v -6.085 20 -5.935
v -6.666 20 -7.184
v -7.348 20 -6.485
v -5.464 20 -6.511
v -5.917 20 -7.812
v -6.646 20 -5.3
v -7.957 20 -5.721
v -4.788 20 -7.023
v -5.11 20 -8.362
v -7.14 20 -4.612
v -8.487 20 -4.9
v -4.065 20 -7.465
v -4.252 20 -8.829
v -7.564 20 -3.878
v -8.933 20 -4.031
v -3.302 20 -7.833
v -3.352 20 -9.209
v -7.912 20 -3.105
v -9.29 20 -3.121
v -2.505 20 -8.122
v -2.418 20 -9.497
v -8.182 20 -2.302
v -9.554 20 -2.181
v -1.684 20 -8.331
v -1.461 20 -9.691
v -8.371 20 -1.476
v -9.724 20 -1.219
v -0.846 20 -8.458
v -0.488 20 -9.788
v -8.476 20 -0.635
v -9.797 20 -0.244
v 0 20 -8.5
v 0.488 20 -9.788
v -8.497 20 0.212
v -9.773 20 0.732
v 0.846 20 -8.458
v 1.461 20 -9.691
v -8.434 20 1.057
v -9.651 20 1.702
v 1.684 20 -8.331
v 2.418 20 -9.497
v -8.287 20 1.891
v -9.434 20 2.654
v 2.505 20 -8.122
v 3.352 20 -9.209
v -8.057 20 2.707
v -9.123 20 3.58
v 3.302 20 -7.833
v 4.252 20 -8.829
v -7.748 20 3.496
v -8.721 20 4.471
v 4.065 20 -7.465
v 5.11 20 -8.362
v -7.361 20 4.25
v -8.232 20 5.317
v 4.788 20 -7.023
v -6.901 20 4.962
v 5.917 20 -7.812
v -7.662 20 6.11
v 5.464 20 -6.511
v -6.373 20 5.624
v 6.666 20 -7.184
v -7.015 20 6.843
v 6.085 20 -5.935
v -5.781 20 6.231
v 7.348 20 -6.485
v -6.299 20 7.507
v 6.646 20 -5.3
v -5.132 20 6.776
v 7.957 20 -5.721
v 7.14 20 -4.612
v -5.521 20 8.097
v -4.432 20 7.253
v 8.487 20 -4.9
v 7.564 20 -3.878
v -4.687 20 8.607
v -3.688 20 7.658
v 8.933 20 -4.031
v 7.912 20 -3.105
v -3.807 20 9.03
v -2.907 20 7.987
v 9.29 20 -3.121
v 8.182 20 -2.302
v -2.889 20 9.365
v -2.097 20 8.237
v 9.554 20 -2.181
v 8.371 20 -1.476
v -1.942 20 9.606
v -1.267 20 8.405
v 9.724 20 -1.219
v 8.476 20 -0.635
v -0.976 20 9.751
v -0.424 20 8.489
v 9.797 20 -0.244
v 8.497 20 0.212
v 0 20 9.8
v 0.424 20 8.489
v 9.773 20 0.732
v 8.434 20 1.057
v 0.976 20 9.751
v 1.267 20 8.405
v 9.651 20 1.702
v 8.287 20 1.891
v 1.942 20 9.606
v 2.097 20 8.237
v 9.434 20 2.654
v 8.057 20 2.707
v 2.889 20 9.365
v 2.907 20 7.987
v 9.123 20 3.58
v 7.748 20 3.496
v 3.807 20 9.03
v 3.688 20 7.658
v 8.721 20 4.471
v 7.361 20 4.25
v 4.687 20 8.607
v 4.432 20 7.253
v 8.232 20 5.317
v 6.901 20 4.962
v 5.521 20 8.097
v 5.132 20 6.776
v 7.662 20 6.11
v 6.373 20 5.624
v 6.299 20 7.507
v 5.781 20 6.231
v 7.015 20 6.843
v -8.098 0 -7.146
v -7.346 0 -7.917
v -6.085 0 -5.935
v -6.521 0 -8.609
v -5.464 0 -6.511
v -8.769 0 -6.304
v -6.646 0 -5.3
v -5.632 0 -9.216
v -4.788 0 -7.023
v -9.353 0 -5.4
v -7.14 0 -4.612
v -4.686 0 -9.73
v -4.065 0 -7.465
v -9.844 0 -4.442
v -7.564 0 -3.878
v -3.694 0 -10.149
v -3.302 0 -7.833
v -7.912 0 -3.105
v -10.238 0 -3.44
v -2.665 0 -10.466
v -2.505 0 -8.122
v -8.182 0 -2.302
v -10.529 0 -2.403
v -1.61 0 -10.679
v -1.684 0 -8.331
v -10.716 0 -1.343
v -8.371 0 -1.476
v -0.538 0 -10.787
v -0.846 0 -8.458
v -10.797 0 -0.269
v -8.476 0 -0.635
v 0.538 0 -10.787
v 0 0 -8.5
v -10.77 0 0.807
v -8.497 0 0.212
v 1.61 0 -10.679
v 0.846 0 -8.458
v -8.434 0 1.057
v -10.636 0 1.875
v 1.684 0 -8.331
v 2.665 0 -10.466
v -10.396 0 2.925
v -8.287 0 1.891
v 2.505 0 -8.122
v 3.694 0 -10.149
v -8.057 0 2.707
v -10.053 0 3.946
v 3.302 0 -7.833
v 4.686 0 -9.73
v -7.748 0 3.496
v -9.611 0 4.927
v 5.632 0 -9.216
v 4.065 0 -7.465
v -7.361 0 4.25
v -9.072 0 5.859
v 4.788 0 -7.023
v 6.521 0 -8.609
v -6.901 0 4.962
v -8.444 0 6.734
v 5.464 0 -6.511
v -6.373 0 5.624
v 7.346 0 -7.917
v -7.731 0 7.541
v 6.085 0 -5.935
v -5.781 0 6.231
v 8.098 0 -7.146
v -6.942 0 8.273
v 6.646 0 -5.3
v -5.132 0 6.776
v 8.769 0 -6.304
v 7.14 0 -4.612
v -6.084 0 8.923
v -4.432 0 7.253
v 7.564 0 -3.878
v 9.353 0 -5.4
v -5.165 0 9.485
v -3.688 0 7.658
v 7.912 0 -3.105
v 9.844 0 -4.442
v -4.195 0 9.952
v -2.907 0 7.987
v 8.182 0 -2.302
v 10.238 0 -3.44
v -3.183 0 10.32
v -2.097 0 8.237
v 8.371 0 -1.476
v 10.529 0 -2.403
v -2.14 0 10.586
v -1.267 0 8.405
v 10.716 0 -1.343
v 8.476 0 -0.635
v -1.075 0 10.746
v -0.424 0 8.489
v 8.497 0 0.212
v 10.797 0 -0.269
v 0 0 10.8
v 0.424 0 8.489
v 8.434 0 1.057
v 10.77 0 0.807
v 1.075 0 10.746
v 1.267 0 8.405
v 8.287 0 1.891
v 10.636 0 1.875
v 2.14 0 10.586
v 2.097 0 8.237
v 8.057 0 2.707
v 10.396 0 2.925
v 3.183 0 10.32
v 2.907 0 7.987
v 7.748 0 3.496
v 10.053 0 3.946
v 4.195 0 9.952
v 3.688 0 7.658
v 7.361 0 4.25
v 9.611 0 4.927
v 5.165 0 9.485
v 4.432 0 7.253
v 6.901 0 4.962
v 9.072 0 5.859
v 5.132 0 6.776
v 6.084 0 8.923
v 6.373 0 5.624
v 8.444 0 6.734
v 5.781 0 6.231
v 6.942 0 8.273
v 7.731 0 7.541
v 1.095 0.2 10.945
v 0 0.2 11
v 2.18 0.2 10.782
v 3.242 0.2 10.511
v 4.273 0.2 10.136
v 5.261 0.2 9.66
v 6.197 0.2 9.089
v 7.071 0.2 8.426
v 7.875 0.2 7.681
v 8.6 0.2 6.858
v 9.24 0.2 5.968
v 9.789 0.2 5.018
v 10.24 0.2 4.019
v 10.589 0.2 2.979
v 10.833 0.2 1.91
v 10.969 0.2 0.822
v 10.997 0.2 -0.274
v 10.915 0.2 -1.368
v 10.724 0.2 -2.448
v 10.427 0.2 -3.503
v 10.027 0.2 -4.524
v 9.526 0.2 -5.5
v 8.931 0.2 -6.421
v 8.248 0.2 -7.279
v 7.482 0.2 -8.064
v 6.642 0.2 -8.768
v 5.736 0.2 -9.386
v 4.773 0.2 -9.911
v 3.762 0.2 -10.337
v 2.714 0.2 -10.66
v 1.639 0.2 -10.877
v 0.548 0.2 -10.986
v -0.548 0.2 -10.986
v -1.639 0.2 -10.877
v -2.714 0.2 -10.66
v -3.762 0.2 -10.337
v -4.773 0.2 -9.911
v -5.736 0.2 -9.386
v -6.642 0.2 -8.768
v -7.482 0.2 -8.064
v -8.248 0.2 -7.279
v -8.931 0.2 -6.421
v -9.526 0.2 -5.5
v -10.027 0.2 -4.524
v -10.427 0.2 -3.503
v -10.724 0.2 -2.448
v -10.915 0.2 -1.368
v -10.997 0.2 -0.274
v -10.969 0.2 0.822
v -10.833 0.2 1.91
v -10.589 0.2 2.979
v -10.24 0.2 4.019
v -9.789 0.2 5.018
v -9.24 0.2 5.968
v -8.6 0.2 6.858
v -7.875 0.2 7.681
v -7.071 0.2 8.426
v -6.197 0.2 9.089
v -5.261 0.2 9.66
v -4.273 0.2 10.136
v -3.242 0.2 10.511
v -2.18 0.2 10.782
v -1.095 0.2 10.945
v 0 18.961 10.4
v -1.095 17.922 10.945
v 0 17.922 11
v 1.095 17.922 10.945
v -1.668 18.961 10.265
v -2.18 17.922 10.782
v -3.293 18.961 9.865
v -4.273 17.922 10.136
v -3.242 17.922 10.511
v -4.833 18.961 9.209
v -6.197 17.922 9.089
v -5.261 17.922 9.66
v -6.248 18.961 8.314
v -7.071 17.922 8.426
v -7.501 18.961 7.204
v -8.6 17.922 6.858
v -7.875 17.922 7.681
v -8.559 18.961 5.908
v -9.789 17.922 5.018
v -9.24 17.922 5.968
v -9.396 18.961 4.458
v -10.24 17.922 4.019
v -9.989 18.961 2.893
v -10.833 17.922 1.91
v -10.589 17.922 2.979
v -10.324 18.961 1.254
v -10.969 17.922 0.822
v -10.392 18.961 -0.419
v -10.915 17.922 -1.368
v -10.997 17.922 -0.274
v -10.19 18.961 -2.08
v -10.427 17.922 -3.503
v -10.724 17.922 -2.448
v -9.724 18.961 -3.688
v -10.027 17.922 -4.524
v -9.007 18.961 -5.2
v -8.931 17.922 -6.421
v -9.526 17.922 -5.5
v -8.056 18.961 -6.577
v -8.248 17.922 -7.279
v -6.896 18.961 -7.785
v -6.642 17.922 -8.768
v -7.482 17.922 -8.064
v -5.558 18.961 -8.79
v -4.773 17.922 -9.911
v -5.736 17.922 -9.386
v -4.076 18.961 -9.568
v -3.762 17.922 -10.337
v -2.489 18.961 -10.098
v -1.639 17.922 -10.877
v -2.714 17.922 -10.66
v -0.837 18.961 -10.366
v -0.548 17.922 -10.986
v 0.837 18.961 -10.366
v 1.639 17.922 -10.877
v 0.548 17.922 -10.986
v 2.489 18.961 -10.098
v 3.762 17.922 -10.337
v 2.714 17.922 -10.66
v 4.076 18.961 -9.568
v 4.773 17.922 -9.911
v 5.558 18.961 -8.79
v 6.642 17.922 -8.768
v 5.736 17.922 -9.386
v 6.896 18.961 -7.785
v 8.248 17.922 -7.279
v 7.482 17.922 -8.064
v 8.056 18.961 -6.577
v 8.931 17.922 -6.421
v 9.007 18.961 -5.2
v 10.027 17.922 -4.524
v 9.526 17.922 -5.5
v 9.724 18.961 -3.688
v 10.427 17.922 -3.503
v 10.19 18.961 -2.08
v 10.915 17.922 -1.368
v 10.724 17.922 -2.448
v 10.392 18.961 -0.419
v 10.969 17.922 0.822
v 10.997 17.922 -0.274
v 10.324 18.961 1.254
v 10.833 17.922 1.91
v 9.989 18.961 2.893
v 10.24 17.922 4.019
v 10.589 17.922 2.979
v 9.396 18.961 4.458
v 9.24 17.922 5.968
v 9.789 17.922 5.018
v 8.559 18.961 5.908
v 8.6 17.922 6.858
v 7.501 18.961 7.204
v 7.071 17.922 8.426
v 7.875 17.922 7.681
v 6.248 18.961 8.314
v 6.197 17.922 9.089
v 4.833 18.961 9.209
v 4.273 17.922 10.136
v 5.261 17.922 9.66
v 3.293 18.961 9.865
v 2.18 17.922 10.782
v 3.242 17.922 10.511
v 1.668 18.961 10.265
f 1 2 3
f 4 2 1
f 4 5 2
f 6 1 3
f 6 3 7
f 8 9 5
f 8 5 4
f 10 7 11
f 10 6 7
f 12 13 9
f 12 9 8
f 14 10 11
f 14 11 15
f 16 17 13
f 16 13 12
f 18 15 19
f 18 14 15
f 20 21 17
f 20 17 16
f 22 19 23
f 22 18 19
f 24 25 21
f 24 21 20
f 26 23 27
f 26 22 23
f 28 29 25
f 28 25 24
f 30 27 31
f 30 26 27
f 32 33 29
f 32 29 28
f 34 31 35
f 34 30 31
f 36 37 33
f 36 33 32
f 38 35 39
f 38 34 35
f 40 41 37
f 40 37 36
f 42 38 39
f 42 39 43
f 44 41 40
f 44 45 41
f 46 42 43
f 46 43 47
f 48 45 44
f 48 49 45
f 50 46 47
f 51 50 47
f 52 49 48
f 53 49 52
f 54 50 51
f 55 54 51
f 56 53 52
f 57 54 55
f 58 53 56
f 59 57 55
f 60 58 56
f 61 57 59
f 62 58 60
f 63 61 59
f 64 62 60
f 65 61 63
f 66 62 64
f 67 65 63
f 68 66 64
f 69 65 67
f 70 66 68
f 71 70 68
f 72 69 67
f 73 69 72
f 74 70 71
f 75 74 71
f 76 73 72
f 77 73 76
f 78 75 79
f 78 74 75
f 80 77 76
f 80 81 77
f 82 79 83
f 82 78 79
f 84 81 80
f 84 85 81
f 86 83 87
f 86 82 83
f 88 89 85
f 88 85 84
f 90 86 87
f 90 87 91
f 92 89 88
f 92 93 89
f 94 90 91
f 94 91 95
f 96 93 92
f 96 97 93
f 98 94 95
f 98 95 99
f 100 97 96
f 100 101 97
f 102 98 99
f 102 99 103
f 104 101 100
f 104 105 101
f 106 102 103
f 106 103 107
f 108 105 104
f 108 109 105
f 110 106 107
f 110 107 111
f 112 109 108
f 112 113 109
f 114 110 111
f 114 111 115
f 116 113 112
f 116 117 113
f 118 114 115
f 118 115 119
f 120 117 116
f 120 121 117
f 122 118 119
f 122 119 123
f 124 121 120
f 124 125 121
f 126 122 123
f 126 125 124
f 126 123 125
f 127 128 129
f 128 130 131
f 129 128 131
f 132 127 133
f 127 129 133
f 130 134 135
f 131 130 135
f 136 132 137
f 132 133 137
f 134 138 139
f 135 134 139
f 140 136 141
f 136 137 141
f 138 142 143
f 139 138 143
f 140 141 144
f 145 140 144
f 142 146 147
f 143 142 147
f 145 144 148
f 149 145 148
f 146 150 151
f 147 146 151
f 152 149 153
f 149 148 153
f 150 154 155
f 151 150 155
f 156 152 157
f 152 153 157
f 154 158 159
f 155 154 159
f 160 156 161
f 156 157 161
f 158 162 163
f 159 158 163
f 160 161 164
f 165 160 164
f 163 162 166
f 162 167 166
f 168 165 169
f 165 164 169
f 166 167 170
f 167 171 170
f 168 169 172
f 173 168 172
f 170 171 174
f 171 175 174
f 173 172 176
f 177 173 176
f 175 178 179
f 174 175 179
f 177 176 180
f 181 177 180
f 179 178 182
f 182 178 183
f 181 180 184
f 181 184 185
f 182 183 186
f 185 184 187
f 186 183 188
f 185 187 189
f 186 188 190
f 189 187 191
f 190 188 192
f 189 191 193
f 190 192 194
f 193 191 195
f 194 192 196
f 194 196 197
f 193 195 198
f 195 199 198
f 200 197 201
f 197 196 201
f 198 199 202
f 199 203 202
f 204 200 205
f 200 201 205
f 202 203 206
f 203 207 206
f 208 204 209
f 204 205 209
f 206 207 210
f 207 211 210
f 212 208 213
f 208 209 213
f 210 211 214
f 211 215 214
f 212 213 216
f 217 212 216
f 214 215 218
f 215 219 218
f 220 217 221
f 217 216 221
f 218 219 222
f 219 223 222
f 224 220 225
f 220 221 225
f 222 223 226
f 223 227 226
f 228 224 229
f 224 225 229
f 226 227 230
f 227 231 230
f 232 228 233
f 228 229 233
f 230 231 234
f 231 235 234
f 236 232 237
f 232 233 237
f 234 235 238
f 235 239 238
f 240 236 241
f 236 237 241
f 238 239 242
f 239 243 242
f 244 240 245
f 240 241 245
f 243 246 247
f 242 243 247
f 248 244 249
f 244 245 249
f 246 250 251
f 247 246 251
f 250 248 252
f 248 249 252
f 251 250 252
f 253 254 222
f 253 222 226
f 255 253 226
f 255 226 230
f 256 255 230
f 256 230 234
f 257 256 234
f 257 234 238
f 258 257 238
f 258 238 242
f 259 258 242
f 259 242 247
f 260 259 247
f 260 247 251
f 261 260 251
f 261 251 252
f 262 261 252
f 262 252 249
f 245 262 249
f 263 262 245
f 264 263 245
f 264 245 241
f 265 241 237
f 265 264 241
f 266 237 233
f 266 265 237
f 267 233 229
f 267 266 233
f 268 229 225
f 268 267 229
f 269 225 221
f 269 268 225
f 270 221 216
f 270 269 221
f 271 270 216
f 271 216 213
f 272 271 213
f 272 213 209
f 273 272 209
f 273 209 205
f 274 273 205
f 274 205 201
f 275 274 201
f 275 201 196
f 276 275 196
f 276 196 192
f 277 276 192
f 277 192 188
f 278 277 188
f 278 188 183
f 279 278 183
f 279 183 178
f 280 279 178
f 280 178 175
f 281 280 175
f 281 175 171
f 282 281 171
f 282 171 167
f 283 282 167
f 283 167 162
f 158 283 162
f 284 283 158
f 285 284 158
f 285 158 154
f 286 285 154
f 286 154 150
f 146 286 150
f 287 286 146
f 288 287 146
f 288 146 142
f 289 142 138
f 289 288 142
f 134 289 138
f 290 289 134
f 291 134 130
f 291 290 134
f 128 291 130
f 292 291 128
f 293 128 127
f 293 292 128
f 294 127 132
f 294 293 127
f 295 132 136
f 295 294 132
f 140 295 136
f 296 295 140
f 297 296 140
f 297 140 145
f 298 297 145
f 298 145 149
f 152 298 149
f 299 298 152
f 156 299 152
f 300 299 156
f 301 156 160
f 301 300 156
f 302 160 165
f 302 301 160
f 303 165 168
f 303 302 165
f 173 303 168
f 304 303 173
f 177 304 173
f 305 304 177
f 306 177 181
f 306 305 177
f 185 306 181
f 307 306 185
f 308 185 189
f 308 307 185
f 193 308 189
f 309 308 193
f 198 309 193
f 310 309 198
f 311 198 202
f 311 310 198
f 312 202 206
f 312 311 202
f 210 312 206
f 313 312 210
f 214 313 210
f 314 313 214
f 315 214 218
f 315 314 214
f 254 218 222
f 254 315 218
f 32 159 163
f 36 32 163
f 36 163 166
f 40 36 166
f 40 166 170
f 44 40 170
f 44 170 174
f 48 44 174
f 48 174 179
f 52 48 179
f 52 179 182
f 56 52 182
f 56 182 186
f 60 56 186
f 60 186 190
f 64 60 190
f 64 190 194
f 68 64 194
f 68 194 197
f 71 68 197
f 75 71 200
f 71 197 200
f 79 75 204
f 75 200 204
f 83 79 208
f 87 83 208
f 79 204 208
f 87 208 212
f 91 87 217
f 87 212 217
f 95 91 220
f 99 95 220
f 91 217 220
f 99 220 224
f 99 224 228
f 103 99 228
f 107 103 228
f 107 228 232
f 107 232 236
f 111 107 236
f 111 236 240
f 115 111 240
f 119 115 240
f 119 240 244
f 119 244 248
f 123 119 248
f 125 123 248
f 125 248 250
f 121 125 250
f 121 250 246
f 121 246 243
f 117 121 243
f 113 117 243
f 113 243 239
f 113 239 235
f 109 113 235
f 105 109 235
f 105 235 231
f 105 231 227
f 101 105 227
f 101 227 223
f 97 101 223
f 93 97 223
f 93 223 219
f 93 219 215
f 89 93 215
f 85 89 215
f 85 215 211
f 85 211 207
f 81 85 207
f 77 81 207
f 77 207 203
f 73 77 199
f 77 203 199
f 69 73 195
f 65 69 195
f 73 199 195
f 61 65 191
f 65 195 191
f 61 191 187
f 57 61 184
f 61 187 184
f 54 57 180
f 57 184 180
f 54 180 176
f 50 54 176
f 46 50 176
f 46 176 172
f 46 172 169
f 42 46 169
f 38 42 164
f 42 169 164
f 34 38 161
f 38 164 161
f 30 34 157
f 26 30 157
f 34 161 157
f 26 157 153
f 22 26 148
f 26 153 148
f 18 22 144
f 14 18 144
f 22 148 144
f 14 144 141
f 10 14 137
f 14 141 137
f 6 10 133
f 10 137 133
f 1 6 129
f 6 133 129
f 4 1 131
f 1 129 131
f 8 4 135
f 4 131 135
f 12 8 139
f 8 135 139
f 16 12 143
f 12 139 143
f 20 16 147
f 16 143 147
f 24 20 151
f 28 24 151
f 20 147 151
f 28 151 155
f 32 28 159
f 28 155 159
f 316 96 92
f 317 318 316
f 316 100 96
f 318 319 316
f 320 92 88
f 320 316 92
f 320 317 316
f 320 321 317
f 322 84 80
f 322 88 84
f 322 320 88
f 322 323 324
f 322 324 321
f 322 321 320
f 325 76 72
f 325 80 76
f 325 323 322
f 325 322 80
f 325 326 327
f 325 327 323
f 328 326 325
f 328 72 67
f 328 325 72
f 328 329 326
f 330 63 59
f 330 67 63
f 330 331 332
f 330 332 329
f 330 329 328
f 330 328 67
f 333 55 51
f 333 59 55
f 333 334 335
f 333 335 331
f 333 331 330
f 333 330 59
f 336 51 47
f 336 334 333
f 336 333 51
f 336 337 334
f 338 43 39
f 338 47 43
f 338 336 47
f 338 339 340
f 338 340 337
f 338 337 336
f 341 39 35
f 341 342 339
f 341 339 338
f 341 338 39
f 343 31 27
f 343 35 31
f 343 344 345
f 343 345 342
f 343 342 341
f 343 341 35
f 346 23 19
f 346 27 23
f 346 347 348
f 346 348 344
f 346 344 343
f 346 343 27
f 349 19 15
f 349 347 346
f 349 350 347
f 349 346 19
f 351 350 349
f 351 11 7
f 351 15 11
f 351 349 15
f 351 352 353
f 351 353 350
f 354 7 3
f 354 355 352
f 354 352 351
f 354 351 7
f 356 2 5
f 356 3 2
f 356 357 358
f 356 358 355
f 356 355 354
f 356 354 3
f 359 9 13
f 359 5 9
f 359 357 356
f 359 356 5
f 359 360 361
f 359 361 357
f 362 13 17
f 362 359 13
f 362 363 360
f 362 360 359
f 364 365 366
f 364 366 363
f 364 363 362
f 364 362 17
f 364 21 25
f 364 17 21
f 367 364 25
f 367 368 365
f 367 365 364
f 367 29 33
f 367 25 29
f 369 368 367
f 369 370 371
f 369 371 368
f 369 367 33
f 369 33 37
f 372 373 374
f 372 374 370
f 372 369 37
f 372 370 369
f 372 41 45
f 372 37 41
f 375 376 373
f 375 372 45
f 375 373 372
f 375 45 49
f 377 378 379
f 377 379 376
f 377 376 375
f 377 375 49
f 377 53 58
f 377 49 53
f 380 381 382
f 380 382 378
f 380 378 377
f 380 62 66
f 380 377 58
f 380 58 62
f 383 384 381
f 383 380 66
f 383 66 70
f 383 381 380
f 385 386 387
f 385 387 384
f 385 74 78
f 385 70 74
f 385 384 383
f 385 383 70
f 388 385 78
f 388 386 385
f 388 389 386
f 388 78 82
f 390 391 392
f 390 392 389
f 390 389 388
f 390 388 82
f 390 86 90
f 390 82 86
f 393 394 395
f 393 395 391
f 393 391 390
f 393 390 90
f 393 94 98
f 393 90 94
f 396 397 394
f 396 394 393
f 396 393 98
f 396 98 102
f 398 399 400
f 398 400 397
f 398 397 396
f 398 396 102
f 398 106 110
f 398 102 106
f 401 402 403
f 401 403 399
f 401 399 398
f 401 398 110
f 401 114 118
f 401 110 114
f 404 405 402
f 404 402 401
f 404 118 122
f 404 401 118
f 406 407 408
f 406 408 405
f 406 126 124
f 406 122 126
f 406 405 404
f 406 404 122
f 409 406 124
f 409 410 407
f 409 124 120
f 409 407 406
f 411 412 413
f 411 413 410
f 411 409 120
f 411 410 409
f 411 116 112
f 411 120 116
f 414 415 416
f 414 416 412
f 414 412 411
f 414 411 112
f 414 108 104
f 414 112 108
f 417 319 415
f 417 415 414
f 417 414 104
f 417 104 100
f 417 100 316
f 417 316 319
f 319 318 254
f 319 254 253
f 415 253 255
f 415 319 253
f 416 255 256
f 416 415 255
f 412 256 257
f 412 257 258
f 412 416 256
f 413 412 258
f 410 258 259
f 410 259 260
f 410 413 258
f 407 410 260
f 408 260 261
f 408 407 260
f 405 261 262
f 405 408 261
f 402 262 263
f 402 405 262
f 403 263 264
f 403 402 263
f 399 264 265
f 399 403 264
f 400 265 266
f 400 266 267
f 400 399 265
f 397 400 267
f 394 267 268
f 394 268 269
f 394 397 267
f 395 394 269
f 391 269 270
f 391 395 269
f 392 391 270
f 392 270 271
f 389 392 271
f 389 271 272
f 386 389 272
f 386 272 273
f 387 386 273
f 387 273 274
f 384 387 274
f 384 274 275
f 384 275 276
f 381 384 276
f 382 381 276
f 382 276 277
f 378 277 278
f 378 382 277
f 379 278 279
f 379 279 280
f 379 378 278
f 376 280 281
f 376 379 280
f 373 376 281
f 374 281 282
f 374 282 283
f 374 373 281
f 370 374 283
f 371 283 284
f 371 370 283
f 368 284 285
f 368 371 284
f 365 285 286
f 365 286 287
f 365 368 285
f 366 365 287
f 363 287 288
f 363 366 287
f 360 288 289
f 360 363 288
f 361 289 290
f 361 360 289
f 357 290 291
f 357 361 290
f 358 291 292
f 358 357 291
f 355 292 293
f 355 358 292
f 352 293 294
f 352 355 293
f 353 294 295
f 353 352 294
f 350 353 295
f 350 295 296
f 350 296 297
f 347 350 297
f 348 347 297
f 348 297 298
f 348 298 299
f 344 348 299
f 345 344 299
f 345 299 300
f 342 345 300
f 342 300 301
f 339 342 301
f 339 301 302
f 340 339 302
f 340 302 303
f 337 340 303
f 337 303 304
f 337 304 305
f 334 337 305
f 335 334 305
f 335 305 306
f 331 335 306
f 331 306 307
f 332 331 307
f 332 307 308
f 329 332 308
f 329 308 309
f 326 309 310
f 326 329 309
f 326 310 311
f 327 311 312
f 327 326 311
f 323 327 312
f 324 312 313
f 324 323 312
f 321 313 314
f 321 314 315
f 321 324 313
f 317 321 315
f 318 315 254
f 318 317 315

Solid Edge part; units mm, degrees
sketch "Sketch1" plane through (0, 0, 0) normal (1, 0, 0) x (0, 1, 0)
  line L0 (0, 11) -> (17.9215, 11)
  line L1 (20, 9.8) -> (17.9215, 11)
  line L2 (20, 0) -> (20, 9.8)
  line L3 (0, 0) -> (20, 0)
  line L4 (0, 0) -> (0, 11)
revolve "RevolvedProtrusion1" add sketch "Sketch1" angle 360 about axis through (0, -25, 0) along (0, 1, 0)
chamfer "Chaflán_1" distance 0.2 angle 45 1 edges at (0, 0, 11)
hole "Agujero_1" at (0, 0, 0) direction (0, 1, 0) diameter 17 end up to next
